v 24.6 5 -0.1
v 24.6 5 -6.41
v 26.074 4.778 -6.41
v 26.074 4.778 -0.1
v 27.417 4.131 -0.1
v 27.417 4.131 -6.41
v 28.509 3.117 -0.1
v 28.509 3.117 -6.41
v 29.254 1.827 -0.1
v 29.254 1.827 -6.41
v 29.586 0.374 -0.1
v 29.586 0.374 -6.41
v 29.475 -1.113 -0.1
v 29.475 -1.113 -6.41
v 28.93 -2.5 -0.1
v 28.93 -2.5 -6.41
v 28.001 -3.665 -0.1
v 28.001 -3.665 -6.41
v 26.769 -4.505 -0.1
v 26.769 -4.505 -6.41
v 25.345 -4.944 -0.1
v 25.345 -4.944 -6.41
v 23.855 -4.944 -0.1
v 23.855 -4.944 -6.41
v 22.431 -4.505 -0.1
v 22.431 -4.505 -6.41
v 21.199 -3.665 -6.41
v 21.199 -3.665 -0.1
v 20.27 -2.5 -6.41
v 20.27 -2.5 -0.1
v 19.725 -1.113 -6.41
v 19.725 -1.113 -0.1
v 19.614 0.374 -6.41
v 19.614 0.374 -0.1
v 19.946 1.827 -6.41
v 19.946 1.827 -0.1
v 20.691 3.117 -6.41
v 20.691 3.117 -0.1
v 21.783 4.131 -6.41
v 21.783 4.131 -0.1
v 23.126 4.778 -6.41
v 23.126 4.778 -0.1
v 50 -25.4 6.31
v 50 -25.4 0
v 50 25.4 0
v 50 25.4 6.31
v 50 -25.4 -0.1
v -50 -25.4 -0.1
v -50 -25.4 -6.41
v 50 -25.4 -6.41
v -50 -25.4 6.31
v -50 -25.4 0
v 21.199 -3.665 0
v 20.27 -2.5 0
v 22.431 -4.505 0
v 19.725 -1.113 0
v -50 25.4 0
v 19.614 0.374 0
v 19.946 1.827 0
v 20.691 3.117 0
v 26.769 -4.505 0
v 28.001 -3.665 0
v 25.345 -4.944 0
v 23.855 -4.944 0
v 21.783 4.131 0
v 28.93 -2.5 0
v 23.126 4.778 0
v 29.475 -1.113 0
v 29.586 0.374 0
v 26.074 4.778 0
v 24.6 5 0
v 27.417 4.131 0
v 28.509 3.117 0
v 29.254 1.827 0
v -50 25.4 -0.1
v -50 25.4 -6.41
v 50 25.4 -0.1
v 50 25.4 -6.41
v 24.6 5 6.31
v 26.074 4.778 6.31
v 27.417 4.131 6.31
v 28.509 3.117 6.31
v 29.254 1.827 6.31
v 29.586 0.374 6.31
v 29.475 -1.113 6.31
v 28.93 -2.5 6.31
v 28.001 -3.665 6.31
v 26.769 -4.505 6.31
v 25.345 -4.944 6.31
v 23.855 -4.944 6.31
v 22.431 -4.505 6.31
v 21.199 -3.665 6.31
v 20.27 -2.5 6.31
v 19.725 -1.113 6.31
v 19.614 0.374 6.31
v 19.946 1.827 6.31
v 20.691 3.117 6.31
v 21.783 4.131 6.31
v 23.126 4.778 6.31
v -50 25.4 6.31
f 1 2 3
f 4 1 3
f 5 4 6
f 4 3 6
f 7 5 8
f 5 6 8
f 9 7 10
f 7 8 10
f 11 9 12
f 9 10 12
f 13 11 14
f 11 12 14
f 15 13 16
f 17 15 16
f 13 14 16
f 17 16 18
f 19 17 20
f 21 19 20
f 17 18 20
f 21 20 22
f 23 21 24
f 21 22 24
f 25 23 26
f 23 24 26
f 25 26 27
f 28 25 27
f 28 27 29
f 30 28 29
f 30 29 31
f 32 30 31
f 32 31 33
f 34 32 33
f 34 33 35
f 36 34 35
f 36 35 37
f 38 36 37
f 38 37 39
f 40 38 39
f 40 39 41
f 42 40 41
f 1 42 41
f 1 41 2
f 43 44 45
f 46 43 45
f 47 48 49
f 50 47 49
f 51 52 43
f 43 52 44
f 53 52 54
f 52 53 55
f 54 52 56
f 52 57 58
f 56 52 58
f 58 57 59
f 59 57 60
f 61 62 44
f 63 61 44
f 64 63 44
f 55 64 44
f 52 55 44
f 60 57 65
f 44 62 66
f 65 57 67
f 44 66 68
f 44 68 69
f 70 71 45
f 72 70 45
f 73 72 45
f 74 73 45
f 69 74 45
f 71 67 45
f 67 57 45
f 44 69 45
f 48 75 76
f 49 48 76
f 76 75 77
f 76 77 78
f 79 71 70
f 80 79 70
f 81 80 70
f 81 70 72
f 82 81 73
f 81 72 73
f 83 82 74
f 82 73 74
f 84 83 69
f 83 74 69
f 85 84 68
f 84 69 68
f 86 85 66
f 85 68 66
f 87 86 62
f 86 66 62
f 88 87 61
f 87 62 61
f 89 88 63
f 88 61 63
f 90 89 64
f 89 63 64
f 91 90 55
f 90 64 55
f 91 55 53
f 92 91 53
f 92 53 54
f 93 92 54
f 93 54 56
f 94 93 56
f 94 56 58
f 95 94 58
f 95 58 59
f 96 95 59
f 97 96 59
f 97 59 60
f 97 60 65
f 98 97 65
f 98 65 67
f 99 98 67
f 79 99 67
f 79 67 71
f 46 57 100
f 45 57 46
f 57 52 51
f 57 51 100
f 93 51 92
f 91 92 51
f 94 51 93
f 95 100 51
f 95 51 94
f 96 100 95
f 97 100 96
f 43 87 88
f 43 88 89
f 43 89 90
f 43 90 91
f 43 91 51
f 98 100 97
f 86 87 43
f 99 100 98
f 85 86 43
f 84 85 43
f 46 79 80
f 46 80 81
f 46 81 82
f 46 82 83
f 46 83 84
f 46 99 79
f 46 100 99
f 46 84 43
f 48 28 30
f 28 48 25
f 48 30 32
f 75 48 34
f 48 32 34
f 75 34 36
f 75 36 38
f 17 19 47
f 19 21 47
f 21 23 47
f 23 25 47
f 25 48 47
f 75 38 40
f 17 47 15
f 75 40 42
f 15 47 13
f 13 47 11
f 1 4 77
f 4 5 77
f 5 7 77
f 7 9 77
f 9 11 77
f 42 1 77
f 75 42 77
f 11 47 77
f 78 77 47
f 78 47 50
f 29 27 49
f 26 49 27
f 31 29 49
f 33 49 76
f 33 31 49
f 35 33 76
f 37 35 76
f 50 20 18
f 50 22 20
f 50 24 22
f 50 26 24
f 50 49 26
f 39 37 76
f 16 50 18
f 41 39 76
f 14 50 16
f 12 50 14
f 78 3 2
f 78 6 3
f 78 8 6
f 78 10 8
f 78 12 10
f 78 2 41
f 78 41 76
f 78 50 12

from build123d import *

# Parameters (mm, degrees)
CROQUIS1_W              = 100
CROQUIS1_H              = 50.8
SALIENTE_EXTRUIR1_DEPTH = 6.31
CROQUIS2_W              = 6.31
CROQUIS2_H              = 50.8
SALIENTE_EXTRUIR2_DEPTH = 100
CROQUIS3_R              = 5
CORTAR_EXTRUIR1_DEPTH   = 50


with BuildPart() as part:
    # Croquis1 → Saliente-Extruir1 (new body)
    with BuildSketch(Plane.XY):
        Rectangle(CROQUIS1_W, CROQUIS1_H)
    extrude(amount=SALIENTE_EXTRUIR1_DEPTH)


with BuildPart() as body_2:
    # Croquis2 → Saliente-Extruir2 (new body)
    with BuildSketch(Plane(origin=(50, 0, 0), x_dir=(0, 0, -1), z_dir=(1, 0, 0))):
        with Locations((3.255, 0)):
            Rectangle(CROQUIS2_W, CROQUIS2_H)
    extrude(amount=-SALIENTE_EXTRUIR2_DEPTH)


with BuildPart() as cortar_extruir1_tool:
    # Croquis3 → Cortar-Extruir1 (new body)
    with BuildSketch(Plane(origin=(0, 0, -6.41), x_dir=(-1, 0, 0), z_dir=(0, 0, -1))):
        with Locations(Location((-24.6, 0, 0), (0, 0, 90))):
            Circle(CROQUIS3_R)
    extrude(amount=-CORTAR_EXTRUIR1_DEPTH)


with BuildPart() as part_1:
    add(part.part)

    # Cortar-Extruir1: cut by cortar_extruir1_tool
    add(cortar_extruir1_tool.part, mode=Mode.SUBTRACT)


with BuildPart() as body_2_1:
    add(body_2.part)

    # Cortar-Extruir1: cut by cortar_extruir1_tool
    add(cortar_extruir1_tool.part, mode=Mode.SUBTRACT)


solid = Compound([part_1.part, body_2_1.part])
